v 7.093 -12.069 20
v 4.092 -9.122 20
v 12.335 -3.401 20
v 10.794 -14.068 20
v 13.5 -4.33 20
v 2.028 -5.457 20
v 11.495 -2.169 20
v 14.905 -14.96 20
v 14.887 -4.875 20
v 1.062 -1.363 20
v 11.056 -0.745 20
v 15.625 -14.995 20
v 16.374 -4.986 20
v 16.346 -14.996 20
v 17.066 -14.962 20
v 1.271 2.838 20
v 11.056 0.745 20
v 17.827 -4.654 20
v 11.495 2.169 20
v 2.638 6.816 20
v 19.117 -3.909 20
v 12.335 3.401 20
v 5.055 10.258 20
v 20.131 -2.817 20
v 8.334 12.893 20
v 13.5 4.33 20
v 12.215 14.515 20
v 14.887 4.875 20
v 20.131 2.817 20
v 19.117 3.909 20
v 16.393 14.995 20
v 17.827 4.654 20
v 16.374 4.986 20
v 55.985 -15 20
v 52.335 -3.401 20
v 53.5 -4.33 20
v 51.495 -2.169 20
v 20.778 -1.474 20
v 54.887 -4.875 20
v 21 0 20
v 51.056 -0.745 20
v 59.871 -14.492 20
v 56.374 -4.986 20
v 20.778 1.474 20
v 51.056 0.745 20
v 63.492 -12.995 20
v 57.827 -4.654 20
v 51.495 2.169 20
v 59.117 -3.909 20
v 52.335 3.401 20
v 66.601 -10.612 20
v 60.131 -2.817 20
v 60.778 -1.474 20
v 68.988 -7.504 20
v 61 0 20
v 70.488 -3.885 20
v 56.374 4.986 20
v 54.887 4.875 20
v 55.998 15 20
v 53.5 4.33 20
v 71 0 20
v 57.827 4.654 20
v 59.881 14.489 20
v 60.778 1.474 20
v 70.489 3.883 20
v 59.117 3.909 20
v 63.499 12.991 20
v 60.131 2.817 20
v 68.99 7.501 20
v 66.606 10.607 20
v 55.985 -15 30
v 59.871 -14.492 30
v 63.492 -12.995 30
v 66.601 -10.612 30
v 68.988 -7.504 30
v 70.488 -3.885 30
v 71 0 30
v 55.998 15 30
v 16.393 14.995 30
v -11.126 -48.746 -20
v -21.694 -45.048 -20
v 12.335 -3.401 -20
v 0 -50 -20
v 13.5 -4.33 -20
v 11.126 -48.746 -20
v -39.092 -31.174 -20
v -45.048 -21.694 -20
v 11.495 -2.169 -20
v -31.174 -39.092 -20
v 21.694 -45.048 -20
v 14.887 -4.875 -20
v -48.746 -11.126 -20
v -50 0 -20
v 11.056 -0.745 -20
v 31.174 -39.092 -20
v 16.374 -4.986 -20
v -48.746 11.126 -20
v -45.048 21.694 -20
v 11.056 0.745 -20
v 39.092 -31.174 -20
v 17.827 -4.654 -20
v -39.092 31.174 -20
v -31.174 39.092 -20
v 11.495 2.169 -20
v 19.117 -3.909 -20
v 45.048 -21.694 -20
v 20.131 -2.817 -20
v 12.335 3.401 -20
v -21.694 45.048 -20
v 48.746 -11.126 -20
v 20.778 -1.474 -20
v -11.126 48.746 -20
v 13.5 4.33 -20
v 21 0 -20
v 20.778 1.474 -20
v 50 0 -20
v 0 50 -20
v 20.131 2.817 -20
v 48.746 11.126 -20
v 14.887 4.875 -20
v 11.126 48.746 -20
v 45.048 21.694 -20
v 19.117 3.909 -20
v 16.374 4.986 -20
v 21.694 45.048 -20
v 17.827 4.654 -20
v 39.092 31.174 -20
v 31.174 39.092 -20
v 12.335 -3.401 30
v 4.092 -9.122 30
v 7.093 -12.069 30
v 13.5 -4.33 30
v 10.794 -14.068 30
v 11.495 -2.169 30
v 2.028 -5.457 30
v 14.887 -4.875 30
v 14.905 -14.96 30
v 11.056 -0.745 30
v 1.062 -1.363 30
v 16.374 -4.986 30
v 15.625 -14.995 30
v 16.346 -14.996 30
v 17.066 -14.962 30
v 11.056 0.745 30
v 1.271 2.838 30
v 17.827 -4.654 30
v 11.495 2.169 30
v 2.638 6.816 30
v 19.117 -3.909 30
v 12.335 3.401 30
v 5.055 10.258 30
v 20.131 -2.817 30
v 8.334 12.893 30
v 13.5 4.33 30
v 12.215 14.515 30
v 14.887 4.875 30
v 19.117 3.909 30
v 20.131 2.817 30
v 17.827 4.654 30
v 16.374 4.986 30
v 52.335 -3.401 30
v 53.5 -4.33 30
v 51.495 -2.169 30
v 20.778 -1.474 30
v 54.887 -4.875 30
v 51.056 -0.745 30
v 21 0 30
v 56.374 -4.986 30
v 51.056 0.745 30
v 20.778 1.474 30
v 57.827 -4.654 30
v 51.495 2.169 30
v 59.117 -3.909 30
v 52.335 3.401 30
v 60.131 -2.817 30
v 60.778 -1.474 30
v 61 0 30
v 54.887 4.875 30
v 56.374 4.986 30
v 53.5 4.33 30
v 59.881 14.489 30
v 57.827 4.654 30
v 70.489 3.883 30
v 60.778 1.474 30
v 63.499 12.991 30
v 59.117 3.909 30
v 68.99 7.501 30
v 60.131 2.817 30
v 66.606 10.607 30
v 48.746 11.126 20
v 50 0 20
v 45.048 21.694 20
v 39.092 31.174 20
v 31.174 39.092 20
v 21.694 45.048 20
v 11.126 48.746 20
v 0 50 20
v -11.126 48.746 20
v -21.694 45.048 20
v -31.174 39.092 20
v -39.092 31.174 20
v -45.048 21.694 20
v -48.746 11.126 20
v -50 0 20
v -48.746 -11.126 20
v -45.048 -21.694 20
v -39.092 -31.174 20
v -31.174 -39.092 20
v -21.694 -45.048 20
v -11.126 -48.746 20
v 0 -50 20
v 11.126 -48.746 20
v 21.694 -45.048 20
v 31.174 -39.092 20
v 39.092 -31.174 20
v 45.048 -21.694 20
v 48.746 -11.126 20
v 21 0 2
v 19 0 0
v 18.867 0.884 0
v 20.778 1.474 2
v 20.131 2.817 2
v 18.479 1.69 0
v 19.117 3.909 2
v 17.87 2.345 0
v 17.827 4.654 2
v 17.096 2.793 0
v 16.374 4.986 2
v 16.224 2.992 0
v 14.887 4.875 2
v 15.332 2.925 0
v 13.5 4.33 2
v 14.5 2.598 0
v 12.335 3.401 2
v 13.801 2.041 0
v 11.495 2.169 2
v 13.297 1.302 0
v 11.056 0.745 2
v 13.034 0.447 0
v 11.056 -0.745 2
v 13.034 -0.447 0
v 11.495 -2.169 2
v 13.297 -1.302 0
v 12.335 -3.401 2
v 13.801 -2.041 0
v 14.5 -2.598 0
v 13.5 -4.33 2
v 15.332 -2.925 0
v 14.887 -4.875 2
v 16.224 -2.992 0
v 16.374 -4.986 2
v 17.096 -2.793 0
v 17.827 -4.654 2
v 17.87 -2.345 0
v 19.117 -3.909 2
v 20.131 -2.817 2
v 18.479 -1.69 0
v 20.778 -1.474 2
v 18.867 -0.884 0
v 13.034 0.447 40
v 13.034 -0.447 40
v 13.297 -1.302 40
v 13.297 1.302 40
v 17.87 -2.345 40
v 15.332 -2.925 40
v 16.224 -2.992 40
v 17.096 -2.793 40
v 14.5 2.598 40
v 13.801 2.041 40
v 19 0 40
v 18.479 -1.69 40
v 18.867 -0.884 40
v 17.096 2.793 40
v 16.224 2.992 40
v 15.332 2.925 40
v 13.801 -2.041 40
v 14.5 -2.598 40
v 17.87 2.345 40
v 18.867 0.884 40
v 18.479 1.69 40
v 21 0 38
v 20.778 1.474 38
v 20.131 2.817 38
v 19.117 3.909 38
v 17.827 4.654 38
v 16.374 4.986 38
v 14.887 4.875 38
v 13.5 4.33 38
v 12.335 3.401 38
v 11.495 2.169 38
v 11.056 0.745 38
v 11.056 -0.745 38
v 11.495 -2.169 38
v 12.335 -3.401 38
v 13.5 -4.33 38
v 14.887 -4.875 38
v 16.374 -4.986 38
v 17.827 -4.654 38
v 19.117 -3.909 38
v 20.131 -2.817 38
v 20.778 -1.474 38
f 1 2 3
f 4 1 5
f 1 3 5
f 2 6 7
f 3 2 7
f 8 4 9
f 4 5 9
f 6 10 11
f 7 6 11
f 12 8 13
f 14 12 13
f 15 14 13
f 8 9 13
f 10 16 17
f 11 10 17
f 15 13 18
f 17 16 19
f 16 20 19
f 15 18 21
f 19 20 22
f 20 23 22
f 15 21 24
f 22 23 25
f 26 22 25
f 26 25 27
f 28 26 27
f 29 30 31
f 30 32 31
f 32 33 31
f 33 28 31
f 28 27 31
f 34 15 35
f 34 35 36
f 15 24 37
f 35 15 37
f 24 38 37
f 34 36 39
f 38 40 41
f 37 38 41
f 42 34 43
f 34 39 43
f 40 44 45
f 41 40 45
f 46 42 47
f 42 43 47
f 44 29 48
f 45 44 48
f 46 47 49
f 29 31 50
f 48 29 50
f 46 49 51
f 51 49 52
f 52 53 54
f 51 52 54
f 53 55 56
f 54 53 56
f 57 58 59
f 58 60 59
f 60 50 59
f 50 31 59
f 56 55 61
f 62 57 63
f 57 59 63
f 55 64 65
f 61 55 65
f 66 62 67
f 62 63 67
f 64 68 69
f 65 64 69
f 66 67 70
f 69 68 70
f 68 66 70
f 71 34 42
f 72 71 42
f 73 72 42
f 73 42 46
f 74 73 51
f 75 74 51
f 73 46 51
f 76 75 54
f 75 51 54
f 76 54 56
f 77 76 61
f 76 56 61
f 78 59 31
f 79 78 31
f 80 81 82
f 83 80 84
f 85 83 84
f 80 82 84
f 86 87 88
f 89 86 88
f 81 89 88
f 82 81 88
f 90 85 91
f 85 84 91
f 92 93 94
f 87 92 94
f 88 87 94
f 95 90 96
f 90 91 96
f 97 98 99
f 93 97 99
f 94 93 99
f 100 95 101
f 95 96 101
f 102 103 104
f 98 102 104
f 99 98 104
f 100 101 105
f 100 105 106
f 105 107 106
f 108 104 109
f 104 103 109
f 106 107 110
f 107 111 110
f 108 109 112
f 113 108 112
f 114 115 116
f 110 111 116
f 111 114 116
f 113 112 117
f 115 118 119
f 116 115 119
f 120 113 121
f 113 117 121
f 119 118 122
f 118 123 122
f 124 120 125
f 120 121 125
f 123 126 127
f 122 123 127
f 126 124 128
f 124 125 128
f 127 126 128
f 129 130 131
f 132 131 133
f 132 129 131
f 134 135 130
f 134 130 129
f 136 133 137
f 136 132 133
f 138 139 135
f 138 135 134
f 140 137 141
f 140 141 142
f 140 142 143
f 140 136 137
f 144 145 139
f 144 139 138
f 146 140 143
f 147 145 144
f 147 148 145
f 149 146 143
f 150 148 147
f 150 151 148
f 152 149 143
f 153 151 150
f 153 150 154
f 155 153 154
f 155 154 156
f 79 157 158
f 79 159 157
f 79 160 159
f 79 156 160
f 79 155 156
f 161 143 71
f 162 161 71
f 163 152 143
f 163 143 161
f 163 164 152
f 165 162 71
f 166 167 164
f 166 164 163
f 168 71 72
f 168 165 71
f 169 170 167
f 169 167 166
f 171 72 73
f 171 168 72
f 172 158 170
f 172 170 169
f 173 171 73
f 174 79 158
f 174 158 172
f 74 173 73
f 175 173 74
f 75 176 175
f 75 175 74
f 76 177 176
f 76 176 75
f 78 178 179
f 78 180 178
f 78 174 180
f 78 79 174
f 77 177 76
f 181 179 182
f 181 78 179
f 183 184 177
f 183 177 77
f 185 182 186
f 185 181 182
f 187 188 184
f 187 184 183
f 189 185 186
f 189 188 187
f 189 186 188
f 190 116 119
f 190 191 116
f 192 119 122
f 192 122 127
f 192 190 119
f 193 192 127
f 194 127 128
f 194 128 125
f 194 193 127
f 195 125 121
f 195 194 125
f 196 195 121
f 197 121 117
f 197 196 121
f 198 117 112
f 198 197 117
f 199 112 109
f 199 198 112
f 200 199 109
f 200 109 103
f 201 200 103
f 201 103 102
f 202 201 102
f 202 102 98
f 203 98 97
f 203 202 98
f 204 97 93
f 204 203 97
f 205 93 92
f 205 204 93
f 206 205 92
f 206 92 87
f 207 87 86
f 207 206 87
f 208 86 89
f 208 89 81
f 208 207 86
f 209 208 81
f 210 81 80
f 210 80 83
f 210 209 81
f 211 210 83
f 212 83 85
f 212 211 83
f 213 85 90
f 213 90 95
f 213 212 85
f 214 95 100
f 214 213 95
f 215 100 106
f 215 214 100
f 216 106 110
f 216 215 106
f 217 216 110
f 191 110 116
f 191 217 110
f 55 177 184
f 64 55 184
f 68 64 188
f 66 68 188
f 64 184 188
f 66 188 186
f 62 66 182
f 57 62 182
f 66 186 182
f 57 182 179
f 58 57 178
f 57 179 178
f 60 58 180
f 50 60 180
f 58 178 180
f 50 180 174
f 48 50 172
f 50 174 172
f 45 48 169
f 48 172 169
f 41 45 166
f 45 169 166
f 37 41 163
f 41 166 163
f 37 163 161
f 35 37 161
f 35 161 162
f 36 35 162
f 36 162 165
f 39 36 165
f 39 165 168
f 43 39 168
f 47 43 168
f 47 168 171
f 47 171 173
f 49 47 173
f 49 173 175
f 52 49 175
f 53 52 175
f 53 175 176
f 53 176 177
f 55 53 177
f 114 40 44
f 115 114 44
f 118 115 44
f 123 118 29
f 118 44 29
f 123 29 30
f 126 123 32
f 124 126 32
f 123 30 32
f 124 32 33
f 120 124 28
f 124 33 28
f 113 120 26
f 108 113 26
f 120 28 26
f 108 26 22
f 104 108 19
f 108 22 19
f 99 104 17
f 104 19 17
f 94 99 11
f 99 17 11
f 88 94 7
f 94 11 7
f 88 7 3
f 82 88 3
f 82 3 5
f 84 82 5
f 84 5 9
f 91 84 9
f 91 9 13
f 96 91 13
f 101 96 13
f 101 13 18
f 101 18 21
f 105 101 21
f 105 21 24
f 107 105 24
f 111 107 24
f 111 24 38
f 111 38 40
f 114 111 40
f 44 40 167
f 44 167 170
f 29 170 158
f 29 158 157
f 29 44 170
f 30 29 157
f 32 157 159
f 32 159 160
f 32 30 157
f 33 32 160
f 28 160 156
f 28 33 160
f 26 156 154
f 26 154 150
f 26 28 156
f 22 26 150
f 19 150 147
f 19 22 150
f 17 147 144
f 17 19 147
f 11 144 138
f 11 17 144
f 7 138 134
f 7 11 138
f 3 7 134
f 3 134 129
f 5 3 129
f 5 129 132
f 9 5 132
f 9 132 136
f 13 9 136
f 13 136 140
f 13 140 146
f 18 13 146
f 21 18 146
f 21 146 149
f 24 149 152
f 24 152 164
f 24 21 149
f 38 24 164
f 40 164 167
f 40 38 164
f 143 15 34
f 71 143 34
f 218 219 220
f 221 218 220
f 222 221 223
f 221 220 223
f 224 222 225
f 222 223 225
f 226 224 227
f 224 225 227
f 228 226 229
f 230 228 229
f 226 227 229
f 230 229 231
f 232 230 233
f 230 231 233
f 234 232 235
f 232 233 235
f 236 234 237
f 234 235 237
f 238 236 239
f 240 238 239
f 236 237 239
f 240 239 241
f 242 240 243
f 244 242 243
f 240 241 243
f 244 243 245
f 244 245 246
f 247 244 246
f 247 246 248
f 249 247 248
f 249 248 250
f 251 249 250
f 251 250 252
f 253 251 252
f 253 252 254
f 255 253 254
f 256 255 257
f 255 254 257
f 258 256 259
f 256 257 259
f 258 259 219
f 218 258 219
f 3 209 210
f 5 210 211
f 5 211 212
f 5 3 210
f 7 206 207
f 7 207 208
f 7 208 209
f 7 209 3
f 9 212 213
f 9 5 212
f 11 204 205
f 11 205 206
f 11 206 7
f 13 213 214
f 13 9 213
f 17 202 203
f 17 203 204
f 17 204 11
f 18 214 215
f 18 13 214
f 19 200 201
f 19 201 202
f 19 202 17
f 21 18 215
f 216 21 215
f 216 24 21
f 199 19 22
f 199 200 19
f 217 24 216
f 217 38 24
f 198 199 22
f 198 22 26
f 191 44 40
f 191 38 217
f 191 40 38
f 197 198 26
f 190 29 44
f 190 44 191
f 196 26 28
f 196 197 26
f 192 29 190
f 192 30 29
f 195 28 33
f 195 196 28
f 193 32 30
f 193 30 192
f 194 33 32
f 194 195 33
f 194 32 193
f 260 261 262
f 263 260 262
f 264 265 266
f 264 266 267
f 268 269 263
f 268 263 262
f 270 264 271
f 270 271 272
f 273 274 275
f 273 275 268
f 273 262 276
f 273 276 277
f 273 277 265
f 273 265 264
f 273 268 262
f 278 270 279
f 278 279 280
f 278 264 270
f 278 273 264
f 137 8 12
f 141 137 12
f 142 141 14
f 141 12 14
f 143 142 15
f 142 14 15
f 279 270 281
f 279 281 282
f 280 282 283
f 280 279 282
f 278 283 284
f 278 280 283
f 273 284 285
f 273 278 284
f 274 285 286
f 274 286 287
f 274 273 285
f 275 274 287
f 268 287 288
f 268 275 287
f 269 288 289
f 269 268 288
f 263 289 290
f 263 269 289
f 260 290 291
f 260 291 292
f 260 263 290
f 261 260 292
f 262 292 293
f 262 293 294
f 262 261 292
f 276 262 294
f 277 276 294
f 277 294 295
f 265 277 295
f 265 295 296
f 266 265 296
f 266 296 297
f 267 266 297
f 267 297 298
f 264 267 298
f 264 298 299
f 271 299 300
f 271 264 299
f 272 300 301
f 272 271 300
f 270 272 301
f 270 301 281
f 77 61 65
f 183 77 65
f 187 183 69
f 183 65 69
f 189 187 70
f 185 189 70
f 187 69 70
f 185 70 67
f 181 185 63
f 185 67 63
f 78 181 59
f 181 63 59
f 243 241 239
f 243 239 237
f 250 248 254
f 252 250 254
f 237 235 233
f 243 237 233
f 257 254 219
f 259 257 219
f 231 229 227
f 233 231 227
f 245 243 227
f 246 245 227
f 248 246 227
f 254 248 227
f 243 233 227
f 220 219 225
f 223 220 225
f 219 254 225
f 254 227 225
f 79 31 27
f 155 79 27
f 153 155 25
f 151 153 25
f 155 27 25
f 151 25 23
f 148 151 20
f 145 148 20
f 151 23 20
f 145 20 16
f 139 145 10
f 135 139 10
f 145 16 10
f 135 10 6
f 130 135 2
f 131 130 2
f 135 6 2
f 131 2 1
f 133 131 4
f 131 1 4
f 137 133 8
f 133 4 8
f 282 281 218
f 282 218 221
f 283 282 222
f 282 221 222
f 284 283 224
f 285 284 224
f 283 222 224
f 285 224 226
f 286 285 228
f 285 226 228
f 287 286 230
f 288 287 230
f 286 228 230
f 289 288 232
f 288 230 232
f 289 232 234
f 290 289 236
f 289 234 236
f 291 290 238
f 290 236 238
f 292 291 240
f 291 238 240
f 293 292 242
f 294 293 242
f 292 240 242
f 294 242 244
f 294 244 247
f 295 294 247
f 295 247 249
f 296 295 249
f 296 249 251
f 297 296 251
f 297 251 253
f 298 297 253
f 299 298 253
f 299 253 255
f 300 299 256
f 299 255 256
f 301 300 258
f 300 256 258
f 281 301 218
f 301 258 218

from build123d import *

# Parameters (mm, degrees)
F0_R          = 50
F1_DEPTH      = 20
F1_DEPTH_BACK = 20
F2_R          = 5
F3_DEPTH      = 40.001
F4_R          = 5
F5_DEPTH      = 40
F6_SIZE       = 2
F7_R          = 5
F8_DEPTH      = 10
F9_R          = 5
F10_DEPTH     = 50.001


with BuildPart() as f1:
    # F0 (on Top) → F1 (new body, two sides)
    with BuildSketch(Plane.XY) as f1_sk:
        Circle(F0_R)
    extrude(amount=F1_DEPTH)
    extrude(f1_sk.sketch, amount=-F1_DEPTH_BACK)

    # F2 (on face) → F3 (cut, through all)
    with BuildSketch(Plane.XY.offset(20)):
        with Locations((16, 0)):
            Circle(F2_R)
    extrude(amount=-F3_DEPTH, mode=Mode.SUBTRACT)


with BuildPart() as f5:
    # F4 (on Top) → F5 (new body)
    with BuildSketch(Plane.XY):
        with Locations((16, 0)):
            Circle(F4_R)
    extrude(amount=F5_DEPTH)

    # F6
    f6_edges = [f5.edges().sort_by_distance(p)[0] for p in [
        (11, 0, 40),
        (11, 0, 0),
    ]]
    chamfer(f6_edges, length=F6_SIZE)


with BuildPart() as f8:
    # F7 (on face) → F8 (new body)
    with BuildSketch(Plane.XY.offset(20)):
        with BuildLine():
            ThreePointArc((17.066113, -14.962065), (26.97706, -10.222727), (31, 0))
            ThreePointArc((31, 0), (26.744821, 10.466557), (16.39349, 14.994838))
            ThreePointArc((16.39349, 14.994838), (1.018492, 0.744586), (14.904727, -14.959959))
            Line((14.904727, -14.959959), (17.066113, -14.962065))
        make_face()
        with Locations((16, 0)):
            Circle(F7_R, mode=Mode.SUBTRACT)
        with BuildLine():
            ThreePointArc((16.39349, 14.994838), (26.744821, 10.466557), (31, 0))
            ThreePointArc((31, 0), (26.97706, -10.222727), (17.066113, -14.962065))
            Line((17.066113, -14.962065), (55.985382, -14.999993))
            ThreePointArc((55.985382, -14.999993), (41.000001, 0.006331), (55.998045, 15))
            Line((55.998045, 15), (16.39349, 14.994838))
        make_face()
        with BuildLine():
            ThreePointArc((14.904727, -14.959959), (15.985382, -14.999993), (17.066113, -14.962065))
            Line((17.066113, -14.962065), (14.904727, -14.959959))
        make_face()
        with BuildLine():
            ThreePointArc((71, 0), (66.60591, 10.607293), (55.998045, 15))
            ThreePointArc((55.998045, 15), (41.000001, 0.006331), (55.985382, -14.999993))
            ThreePointArc((55.985382, -14.999993), (66.601432, -10.611769), (71, 0))
        make_face()
    extrude(amount=F8_DEPTH)

    # F9 (on face) → F10 (cut, through all)
    with BuildSketch(Plane.XY.offset(30)):
        with Locations((56, 0)):
            Circle(F9_R)
    extrude(amount=-F10_DEPTH, mode=Mode.SUBTRACT)


solid = Compound([f1.part, f5.part, f8.part])
